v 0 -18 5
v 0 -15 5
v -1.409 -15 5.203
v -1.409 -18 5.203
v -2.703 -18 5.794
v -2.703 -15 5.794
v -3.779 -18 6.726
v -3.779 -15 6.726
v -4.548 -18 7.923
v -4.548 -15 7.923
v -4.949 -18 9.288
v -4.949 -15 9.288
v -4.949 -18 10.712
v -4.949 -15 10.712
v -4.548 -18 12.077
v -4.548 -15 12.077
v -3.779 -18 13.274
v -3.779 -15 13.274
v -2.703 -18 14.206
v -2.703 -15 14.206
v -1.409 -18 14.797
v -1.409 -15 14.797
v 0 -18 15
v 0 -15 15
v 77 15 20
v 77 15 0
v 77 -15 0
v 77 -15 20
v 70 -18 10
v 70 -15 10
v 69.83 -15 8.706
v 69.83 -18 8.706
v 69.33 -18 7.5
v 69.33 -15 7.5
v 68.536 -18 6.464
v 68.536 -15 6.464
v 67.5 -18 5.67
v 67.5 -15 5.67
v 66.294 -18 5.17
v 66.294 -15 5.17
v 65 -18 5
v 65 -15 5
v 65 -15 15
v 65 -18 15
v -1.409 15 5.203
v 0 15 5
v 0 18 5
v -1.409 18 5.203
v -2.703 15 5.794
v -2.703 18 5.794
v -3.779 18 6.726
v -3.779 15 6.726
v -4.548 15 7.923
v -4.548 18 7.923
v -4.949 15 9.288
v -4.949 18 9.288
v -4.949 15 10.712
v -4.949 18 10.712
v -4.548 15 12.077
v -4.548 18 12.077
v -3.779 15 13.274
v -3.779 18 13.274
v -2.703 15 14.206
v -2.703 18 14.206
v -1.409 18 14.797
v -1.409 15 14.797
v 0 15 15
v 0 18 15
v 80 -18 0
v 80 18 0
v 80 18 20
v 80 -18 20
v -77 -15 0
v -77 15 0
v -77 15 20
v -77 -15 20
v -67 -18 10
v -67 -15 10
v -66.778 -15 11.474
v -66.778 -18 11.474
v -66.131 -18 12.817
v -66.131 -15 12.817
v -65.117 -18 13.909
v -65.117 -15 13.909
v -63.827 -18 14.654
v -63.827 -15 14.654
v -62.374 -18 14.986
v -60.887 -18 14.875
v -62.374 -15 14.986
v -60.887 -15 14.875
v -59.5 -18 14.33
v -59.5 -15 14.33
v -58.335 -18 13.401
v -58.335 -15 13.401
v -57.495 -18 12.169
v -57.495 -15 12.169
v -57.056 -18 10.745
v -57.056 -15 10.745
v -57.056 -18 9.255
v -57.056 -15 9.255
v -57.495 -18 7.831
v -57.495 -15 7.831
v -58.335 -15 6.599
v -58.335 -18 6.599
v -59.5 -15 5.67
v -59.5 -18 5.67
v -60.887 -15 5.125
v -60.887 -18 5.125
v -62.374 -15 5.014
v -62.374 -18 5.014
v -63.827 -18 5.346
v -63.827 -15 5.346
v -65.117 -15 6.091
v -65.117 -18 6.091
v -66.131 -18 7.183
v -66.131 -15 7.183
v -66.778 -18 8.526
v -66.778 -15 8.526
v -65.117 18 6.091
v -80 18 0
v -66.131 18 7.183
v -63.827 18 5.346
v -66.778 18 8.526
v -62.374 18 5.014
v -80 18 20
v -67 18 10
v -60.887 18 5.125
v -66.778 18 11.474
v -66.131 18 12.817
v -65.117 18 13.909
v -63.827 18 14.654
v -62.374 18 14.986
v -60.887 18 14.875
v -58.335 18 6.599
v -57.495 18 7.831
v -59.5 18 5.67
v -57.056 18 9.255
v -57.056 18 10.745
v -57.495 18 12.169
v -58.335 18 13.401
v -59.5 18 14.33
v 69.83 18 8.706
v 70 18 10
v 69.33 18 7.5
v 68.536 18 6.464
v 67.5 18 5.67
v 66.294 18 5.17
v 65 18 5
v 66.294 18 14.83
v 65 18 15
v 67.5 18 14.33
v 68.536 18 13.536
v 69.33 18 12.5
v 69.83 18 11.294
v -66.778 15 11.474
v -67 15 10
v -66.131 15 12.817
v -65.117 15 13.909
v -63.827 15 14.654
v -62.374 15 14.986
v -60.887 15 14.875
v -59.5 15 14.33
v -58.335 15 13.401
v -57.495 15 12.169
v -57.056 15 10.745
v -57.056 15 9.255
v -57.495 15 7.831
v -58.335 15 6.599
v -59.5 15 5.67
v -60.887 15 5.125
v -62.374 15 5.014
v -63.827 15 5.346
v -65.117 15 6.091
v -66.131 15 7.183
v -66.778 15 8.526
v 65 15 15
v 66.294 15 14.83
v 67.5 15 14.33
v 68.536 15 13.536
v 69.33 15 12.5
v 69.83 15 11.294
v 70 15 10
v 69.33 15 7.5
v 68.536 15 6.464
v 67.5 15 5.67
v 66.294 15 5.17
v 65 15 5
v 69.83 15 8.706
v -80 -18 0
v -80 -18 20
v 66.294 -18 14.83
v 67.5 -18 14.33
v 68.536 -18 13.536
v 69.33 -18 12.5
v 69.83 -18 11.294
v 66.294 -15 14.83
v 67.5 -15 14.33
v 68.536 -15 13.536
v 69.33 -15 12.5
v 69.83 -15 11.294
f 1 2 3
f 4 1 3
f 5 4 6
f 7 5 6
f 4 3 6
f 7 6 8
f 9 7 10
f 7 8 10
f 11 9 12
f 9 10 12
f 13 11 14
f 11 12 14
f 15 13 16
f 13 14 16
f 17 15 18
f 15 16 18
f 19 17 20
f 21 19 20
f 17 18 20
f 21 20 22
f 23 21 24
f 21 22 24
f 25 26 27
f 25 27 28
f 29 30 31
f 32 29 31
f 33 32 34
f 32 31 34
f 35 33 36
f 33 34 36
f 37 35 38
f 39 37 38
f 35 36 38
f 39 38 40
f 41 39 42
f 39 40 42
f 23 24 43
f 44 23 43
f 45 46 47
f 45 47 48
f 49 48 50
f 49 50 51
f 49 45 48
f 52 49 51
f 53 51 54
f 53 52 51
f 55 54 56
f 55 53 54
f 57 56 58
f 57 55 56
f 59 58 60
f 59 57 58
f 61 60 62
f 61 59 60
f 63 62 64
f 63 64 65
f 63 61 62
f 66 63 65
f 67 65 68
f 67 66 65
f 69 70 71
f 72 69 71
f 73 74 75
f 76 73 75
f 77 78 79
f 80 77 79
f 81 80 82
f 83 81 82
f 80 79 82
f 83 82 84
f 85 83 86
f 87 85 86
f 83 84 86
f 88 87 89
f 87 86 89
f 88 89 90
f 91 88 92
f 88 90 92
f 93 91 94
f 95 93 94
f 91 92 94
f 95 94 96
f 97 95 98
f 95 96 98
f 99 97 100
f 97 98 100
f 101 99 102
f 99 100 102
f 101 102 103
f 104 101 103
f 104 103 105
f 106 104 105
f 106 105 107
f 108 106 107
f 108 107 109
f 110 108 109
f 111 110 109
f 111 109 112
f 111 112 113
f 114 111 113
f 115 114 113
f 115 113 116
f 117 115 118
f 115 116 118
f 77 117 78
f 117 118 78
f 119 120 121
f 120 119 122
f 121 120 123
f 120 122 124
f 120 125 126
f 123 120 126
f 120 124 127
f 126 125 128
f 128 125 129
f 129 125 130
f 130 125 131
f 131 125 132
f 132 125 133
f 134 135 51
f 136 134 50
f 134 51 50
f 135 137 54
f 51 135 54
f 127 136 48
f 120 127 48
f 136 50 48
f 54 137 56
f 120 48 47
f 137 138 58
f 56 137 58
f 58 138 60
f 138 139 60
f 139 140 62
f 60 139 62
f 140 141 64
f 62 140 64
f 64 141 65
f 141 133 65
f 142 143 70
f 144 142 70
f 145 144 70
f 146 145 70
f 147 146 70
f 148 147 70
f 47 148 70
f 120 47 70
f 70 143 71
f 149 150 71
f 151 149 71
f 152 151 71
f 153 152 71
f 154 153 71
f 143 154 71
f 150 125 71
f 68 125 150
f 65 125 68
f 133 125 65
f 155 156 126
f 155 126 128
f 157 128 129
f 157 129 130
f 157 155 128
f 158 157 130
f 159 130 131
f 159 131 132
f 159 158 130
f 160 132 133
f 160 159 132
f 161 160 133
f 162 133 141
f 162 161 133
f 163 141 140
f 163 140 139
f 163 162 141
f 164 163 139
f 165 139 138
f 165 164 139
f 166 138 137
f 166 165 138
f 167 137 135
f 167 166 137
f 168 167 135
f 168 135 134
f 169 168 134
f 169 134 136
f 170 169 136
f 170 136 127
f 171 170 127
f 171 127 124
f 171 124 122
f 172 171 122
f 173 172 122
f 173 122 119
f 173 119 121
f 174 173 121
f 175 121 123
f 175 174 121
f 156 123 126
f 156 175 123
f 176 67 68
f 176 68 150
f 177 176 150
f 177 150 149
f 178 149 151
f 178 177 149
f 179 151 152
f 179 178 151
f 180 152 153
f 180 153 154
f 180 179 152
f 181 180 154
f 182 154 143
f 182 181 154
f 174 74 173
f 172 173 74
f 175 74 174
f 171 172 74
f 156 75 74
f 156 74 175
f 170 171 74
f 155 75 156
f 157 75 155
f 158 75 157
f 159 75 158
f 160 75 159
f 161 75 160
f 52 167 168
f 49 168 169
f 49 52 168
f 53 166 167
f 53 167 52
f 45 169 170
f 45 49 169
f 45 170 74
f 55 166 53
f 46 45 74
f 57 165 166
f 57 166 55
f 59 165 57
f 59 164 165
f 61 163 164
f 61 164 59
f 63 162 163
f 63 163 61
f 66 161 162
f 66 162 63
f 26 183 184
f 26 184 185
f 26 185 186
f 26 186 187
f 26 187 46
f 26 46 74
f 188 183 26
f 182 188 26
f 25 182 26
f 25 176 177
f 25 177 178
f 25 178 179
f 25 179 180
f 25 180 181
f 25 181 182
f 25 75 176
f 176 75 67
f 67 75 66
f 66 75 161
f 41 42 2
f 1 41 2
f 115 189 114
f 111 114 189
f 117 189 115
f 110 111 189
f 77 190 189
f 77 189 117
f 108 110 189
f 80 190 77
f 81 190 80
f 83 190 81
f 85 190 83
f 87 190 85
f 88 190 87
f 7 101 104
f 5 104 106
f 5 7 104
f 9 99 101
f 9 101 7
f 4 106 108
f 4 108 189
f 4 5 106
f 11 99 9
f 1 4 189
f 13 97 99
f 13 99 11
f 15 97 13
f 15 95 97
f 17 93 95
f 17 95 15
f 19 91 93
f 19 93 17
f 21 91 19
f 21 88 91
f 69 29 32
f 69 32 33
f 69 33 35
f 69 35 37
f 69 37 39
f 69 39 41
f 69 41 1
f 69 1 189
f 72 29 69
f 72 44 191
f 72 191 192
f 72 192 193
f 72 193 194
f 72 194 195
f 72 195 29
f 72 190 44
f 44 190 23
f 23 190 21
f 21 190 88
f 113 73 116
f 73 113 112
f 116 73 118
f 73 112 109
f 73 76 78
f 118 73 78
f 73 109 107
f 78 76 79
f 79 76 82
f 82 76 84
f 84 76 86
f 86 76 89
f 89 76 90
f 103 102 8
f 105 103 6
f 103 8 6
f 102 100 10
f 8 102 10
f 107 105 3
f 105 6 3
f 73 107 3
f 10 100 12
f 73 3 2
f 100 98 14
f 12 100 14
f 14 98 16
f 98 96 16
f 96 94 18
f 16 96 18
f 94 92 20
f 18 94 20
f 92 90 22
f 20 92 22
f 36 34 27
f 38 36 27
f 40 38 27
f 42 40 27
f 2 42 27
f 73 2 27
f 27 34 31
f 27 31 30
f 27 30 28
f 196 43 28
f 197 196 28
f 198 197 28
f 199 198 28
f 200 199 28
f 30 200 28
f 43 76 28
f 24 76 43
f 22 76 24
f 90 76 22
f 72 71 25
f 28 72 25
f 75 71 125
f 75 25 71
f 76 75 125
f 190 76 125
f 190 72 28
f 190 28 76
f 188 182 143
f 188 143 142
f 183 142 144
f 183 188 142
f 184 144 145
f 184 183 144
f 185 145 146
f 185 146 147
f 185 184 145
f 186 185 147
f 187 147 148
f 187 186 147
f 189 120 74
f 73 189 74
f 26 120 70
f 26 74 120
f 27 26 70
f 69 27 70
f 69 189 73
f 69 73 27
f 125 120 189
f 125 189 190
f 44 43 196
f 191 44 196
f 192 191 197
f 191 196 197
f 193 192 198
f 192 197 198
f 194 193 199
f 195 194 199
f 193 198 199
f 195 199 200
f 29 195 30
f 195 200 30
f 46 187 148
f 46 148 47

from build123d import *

# Parameters (mm, degrees)
F1_W     = 3
F1_H     = 20
F2_DEPTH = 15
F3_DEPTH = 3


with BuildPart() as f2:
    # F1 (on offset) → F2 (new body, through all)
    with BuildSketch(Plane.XZ.offset(15)):
        with Locations((78.5, 10)):
            Rectangle(F1_W, F1_H)
    extrude(amount=-F2_DEPTH)



with BuildPart() as f2b:
    # F1 (on offset) → F2, piece 2 (new body, through all)
    with BuildSketch(Plane.XZ.offset(15)):
        with Locations((-78.5, 10)):
            Rectangle(F1_W, F1_H)
    extrude(amount=-F2_DEPTH)


with BuildPart() as f2_1:
    add(f2.part)

    add(f2b.part)  # F3 merges F2b
    # F1 (on offset) → F3 (join)
    with BuildSketch(Plane.XZ.offset(15)):
        with BuildLine():
            Line((0, 5), (0, 0))
            Line((0, 0), (67, 0))
            Line((67, 0), (77, 0))
            Line((77, 0), (77, 20))
            Line((77, 20), (0, 20))
            Line((0, 20), (0, 15))
            Line((0, 15), (65, 15))
            ThreePointArc((65, 15), (68.5355339059, 13.5355339059), (70, 10))
            ThreePointArc((70, 10), (68.5355339059, 6.4644660941), (65, 5))
            Line((65, 5), (0, 5))
        make_face()
        with BuildLine():
            Line((-67, 10), (-67, 0))
            Line((-67, 0), (0, 0))
            Line((0, 0), (0, 5))
            ThreePointArc((0, 5), (-5, 10), (0, 15))
            Line((0, 15), (0, 20))
            Line((0, 20), (-67, 20))
            Line((-67, 20), (-67, 10))
        make_face()
        with BuildLine():
            ThreePointArc((-57, 10), (-62, 5), (-67, 10))
            ThreePointArc((-67, 10), (-62, 15), (-57, 10))
        make_face(mode=Mode.SUBTRACT)
        Polygon((-77, 20), (-77, 0), (-67, 0), (-67, 10), (-67, 20), align=None)
        with Locations((-78.5, 10)):
            Rectangle(F1_W, F1_H)
        with Locations((78.5, 10)):
            Rectangle(F1_W, F1_H)
    extrude(amount=F3_DEPTH)

    # F4: F2 across plane


with BuildPart() as f2_2:
    add(f2_1.part)
    add(f2_1.part.mirror(Plane.XZ))


solid = f2_2.part
